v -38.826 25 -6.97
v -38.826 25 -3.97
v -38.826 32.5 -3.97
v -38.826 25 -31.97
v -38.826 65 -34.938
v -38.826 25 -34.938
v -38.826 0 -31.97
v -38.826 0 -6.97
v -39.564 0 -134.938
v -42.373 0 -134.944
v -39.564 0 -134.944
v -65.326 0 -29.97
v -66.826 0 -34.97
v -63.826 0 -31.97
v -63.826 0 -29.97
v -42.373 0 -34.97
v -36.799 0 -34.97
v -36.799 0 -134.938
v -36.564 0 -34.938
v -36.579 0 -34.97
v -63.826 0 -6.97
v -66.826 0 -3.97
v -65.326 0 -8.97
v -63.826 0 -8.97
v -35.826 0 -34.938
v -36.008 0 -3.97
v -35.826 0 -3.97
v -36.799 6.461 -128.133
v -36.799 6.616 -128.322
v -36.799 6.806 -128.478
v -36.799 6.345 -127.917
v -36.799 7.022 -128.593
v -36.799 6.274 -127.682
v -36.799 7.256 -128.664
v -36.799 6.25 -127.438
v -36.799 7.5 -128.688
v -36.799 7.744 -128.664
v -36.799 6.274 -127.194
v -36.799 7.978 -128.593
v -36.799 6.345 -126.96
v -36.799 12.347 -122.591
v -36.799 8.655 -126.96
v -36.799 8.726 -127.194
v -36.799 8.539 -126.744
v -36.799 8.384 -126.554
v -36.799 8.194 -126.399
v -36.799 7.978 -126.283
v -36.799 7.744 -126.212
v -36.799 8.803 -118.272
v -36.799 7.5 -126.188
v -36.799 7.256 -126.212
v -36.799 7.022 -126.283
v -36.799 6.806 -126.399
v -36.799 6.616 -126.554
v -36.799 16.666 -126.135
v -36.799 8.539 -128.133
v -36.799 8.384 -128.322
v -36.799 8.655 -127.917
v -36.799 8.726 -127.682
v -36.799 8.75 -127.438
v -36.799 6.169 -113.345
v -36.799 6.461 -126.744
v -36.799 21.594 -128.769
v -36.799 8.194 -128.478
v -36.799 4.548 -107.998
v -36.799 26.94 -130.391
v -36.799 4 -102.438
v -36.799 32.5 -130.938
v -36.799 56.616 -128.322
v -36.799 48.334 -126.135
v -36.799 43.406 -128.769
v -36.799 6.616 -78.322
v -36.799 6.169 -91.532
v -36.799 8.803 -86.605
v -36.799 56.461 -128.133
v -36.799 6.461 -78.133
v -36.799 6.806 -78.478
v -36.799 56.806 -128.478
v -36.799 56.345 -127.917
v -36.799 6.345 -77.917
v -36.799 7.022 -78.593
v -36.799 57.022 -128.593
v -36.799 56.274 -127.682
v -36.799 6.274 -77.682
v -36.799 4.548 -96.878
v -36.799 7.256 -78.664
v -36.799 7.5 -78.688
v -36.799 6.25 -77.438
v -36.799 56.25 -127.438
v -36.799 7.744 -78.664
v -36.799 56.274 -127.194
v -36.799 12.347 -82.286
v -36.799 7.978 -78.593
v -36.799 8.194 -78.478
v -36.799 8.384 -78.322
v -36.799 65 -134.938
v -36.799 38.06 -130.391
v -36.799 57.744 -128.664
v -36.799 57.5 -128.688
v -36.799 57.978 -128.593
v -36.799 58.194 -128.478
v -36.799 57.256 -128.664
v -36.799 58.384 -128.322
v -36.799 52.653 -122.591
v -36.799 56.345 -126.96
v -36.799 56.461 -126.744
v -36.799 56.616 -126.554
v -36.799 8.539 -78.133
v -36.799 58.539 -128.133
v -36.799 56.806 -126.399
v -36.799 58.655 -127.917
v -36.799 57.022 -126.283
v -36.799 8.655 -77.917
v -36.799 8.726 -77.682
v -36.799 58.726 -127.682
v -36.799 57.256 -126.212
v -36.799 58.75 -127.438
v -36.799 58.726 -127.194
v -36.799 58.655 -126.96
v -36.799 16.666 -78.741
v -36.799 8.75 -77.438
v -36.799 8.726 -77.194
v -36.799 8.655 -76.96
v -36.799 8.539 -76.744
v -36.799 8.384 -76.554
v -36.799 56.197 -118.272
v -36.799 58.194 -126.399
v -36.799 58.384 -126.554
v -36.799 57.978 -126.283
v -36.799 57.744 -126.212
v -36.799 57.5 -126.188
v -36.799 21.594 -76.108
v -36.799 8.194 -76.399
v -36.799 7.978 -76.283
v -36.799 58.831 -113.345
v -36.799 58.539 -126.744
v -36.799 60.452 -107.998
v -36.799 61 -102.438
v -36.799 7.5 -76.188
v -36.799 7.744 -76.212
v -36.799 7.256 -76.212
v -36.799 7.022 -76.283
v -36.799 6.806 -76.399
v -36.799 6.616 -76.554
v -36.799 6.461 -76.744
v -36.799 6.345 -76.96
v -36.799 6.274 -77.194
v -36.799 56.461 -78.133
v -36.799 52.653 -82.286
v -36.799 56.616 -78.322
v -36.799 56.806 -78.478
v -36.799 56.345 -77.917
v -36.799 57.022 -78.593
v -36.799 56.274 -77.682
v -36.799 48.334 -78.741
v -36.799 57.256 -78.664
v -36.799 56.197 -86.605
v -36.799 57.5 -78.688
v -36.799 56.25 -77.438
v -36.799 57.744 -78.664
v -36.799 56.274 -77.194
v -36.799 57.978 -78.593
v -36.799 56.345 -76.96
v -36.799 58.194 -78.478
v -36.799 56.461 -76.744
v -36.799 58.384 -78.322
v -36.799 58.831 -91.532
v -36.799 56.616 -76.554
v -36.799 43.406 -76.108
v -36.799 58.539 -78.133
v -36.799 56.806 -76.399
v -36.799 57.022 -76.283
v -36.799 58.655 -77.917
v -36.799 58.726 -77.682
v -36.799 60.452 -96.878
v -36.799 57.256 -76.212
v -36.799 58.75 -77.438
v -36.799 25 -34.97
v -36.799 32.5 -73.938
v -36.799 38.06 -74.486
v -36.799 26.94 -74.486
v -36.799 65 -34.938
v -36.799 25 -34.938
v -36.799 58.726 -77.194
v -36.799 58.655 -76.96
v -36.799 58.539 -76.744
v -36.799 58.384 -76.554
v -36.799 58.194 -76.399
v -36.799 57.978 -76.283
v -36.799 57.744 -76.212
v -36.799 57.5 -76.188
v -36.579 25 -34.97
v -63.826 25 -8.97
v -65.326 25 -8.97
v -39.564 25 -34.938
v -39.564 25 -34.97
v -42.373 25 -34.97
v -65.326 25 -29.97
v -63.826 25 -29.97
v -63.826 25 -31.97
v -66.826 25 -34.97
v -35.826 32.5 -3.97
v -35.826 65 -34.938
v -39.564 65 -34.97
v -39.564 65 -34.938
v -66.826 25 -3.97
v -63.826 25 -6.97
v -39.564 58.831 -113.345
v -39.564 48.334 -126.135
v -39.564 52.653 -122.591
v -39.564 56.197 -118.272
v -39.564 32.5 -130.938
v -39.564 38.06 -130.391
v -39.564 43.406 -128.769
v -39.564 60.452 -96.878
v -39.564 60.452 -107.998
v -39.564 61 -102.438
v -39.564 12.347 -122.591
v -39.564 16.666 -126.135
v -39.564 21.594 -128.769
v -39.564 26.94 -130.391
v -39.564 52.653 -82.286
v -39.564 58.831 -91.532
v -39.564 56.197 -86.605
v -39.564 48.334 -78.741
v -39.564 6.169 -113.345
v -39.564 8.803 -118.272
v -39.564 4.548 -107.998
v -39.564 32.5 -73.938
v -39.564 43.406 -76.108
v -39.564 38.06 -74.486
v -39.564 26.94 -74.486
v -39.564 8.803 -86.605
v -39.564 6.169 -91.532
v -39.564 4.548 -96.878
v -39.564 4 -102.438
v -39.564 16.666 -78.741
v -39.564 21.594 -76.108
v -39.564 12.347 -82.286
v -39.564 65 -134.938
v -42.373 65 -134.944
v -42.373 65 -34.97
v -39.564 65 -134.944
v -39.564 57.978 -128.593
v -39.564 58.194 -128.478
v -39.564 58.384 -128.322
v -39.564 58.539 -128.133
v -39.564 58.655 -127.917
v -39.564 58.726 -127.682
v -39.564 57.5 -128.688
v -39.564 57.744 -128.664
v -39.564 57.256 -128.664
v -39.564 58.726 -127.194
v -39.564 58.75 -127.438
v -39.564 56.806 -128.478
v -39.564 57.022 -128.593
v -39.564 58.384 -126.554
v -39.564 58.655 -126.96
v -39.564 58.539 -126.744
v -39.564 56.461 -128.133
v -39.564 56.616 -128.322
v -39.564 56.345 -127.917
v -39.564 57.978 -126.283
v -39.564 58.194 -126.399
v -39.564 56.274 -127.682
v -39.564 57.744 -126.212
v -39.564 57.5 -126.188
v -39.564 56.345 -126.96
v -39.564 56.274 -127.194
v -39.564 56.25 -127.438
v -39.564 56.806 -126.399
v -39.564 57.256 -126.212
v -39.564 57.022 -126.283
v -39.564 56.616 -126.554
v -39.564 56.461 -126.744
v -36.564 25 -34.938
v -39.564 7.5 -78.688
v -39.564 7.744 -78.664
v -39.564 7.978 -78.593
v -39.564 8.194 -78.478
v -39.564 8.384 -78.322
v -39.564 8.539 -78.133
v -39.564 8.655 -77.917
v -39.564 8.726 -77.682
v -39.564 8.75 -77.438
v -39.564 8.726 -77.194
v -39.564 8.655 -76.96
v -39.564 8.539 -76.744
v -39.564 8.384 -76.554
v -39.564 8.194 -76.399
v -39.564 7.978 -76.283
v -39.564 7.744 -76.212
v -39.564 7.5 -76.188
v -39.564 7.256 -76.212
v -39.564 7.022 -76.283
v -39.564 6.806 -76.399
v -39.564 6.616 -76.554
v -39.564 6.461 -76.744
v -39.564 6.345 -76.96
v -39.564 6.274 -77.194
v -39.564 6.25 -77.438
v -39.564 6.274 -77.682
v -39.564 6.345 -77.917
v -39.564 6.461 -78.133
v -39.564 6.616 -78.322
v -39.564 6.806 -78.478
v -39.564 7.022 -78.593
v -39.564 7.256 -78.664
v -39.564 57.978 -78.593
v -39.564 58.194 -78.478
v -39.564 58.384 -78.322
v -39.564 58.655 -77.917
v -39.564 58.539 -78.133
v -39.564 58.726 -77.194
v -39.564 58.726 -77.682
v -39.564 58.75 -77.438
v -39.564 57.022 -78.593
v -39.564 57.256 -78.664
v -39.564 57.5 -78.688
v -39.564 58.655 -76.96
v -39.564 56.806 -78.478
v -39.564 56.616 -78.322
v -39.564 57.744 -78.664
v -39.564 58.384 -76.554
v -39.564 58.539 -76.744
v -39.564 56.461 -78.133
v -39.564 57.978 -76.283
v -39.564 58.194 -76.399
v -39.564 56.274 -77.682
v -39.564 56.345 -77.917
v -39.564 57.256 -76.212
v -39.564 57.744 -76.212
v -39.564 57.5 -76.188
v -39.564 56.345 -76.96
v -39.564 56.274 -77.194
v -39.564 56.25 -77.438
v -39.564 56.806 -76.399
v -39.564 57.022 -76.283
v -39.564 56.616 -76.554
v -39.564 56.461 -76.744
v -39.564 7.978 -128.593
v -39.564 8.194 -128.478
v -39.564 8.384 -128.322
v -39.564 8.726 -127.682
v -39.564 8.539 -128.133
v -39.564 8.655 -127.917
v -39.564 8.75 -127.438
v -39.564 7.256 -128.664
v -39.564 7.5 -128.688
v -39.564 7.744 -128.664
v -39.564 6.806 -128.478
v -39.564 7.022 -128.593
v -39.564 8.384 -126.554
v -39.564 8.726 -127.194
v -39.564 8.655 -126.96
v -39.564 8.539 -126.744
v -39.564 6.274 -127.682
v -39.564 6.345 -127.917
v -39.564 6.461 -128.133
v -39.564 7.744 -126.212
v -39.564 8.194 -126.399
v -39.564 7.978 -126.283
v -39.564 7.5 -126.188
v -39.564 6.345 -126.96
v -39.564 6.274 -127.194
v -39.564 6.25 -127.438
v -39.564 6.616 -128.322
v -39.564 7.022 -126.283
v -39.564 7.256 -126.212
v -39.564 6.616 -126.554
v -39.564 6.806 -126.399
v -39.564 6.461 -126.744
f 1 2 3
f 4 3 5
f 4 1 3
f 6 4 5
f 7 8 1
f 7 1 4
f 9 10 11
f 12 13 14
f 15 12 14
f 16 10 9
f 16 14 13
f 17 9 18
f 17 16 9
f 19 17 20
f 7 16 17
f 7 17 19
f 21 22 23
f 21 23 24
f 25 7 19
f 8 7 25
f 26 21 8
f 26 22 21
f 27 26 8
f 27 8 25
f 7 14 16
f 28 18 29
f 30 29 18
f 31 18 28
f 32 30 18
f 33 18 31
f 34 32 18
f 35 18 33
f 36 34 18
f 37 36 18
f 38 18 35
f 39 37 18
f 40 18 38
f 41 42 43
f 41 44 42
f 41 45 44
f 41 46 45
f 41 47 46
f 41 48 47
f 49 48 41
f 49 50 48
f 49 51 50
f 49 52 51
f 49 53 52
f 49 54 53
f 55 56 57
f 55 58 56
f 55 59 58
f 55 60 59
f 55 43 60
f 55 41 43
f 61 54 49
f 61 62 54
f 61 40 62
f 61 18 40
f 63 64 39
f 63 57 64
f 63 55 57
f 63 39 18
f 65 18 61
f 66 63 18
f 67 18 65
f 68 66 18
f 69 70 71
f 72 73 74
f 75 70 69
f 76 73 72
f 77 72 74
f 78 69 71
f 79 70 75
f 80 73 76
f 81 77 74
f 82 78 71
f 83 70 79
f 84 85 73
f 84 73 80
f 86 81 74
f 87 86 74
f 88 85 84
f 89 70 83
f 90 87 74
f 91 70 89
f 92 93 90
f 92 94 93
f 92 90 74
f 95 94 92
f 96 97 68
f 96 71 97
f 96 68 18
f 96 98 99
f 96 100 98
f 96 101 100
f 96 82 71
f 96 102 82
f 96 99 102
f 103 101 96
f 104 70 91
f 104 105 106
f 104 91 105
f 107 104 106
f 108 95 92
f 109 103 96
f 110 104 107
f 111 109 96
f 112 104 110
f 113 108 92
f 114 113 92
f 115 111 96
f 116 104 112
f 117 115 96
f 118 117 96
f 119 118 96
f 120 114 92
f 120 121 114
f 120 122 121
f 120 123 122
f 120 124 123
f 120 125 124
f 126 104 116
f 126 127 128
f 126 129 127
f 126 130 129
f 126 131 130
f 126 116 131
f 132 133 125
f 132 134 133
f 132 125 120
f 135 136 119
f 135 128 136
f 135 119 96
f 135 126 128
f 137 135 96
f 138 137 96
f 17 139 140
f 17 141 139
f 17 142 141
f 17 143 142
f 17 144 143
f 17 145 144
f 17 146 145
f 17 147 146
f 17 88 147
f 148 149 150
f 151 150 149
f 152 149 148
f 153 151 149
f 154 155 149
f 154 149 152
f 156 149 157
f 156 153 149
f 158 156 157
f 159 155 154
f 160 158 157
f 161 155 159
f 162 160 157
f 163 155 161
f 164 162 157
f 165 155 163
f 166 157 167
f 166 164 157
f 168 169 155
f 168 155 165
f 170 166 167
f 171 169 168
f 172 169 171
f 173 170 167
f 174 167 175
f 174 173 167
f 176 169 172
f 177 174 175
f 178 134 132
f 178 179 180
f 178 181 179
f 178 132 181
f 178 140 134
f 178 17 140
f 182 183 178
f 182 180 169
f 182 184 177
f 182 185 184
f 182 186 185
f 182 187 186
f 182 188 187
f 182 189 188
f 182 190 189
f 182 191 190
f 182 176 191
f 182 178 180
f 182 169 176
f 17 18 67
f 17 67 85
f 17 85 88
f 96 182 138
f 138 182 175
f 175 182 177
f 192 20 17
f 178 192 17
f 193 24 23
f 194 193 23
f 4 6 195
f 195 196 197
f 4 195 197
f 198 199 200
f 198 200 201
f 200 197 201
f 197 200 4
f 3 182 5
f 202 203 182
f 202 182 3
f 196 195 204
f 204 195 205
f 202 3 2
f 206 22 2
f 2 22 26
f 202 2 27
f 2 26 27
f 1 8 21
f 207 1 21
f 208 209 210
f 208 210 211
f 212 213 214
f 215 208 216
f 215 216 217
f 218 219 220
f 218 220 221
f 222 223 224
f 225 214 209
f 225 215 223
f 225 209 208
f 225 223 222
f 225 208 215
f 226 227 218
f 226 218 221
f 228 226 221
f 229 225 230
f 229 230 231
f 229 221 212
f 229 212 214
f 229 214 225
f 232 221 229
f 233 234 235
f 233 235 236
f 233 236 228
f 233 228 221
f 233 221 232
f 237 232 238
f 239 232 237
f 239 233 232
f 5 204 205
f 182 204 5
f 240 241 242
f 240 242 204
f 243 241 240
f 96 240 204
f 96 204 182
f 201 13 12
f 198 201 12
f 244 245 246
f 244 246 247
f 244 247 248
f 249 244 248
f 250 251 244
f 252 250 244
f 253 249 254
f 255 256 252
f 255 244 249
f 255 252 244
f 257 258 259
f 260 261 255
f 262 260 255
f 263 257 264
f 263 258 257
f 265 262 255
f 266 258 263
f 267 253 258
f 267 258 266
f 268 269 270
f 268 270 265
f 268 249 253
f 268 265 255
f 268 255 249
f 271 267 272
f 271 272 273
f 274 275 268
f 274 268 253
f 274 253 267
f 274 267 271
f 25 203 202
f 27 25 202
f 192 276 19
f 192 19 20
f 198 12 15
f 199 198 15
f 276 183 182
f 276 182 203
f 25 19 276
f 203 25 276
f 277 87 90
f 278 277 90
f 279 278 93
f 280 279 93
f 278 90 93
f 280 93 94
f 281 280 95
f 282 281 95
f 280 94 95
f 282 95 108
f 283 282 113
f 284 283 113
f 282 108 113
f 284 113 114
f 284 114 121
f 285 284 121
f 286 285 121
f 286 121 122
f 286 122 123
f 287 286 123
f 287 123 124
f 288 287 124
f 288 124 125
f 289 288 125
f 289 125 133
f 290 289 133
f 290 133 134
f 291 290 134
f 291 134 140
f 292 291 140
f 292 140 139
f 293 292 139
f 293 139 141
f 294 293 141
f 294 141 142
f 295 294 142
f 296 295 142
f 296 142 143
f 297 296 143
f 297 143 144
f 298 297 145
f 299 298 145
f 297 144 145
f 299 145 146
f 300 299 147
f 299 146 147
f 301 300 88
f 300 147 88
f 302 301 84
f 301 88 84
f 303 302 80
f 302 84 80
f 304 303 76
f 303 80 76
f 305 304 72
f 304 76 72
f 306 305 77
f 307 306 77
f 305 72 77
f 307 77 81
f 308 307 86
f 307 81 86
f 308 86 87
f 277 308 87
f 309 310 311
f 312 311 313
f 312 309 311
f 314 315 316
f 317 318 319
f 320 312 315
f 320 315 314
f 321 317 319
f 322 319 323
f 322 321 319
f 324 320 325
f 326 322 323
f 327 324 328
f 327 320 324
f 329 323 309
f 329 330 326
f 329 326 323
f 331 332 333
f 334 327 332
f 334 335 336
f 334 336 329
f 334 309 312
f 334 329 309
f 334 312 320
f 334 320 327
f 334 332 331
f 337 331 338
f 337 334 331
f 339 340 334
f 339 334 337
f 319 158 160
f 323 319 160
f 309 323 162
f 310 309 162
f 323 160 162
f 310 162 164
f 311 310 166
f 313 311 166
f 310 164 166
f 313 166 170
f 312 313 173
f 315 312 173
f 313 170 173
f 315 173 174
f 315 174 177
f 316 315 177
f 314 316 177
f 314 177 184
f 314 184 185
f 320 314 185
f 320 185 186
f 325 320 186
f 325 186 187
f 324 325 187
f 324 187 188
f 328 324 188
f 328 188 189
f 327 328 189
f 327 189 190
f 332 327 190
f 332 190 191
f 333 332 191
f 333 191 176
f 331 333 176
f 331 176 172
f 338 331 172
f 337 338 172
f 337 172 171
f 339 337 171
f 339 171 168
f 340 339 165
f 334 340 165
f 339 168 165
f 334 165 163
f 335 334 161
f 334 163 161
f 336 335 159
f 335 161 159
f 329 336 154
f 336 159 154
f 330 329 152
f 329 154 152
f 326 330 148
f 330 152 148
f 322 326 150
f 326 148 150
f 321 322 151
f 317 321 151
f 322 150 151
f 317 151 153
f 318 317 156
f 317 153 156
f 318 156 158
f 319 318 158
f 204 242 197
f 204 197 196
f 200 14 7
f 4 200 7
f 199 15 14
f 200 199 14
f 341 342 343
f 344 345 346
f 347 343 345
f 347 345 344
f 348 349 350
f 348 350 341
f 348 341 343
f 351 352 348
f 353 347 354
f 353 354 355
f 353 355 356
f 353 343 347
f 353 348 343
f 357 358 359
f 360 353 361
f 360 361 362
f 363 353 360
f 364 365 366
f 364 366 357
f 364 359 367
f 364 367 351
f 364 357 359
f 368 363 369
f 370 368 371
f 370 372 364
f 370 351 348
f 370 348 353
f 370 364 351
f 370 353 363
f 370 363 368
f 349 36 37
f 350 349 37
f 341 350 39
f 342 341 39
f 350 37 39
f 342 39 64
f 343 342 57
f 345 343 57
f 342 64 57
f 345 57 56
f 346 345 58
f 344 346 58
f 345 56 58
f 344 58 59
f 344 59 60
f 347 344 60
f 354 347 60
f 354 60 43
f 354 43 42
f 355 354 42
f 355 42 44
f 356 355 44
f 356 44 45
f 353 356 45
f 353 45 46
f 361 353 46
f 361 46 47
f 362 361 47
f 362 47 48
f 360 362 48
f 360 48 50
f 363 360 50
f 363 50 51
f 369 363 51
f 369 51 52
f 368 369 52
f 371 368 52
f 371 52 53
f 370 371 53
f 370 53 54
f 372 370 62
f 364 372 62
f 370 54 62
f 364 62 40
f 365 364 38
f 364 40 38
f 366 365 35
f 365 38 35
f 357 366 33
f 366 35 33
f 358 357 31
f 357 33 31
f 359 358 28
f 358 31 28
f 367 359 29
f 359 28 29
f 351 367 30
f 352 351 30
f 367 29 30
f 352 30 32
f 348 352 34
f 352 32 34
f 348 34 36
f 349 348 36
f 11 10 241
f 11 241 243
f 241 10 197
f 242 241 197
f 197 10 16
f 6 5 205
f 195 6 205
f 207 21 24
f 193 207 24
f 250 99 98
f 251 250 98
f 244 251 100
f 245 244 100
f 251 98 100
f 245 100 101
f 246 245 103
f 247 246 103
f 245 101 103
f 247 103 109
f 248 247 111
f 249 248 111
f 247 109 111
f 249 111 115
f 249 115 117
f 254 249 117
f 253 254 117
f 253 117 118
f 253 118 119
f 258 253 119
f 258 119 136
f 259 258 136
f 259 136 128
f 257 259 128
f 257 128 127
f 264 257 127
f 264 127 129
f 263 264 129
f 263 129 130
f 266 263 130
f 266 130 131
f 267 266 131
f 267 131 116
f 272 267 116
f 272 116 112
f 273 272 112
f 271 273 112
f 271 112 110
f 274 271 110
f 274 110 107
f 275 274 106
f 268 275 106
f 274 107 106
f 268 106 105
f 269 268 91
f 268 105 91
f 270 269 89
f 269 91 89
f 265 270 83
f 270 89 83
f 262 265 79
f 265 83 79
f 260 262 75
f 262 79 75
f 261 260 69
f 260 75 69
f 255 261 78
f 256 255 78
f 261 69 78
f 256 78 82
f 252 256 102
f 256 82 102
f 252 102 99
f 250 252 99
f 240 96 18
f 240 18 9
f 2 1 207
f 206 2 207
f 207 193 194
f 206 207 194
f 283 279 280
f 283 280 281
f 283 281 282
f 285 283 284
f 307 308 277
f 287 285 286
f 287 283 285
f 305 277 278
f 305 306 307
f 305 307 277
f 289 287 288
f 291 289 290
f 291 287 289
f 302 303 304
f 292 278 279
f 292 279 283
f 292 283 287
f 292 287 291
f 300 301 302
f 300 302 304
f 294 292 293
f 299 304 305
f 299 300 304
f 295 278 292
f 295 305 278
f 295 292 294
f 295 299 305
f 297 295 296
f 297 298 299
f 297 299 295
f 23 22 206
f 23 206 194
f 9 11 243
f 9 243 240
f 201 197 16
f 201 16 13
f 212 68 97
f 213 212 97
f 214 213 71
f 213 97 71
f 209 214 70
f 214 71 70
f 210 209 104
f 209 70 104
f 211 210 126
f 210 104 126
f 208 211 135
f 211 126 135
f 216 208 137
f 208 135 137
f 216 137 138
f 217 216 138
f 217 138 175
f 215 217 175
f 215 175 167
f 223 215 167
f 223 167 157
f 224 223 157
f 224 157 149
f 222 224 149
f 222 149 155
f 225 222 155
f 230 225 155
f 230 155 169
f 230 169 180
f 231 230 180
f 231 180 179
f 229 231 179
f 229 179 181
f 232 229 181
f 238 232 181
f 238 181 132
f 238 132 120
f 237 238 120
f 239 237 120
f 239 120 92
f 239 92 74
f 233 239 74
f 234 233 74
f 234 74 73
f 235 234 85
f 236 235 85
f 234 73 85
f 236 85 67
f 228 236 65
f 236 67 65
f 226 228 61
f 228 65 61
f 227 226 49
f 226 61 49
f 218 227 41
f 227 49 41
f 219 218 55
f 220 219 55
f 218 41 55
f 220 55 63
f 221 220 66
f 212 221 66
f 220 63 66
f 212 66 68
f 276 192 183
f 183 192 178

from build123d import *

# Parameters (mm, degrees)
EXTRUDE_1_DEPTH      = 25
CUT_EXTRUDE_4_DEPTH  = 80.457942189
SKETCH_7_W           = 16.60831278
SKETCH_7_H           = 38.473598513
CUT_EXTRUDE_14_DEPTH = 80.457942189
SKETCH_8_W           = 5
SKETCH_8_H           = 30.968526609
EXTRUDE_2_DEPTH      = 25
SKETCH_9_W           = 2.765387297
SKETCH_9_H           = 65
EXTRUDE_3_DEPTH      = 100
SKETCH_10_W          = 5.026813651
SKETCH_10_H          = 30.968526609
EXTRUDE_4_DEPTH      = 40
CUT_EXTRUDE_15_DEPTH = 100
SKETCH_12_R          = 28.5
CUT_EXTRUDE_16_DEPTH = 100
SKETCH_13_R          = 1.25
CUT_EXTRUDE_17_DEPTH = 100
SKETCH_14_W          = 2.026813651
SKETCH_14_H          = 30.968526609
CUT_EXTRUDE_19_DEPTH = 100
EXTRUDE_5_REACH      = 166.009
SKETCH_16_W          = 2.808181224
SKETCH_16_H          = 99.974557172


with BuildPart() as part:
    # Эскиз1 → Бобышка-Вытянуть1 (new body)
    with BuildSketch(Plane(origin=(0, 0, 0), x_dir=(1, 0, 0), z_dir=(0, 1, 0))):
        Polygon((-66.825757576, 34.969739794), (-66.825757576, 29.969739794), (-63.825757576, 29.969739794), (-63.825757576, 31.969739794), (-38.825757576, 31.969739794), (-38.825757576, 6.969739794), (-63.825757576, 6.969739794), (-63.825757576, 8.969739794), (-66.825757576, 8.969739794), (-66.825757576, 3.969739794), (-22.123470102, 3.969739794), (-36.579007505, 34.969739794), align=None)
    extrude(amount=EXTRUDE_1_DEPTH)

    # Эскиз3 → Вырез-Вытянуть4 (cut, through all)
    with BuildSketch(Plane.XZ):
        Polygon((-66.825757576, -3.969739794), (-65.325757576, -8.969739794), (-66.825757576, -8.969739794), align=None)
        Polygon((-66.825757576, -29.969739794), (-66.825757576, -34.969739794), (-65.325757576, -29.969739794), align=None)
    extrude(amount=-CUT_EXTRUDE_4_DEPTH, mode=Mode.SUBTRACT)

    # Эскиз7 → Вырез-Вытянуть14 (cut, through all)
    with BuildSketch(Plane(origin=(0, 0, 0), x_dir=(-1, 0, 0), z_dir=(0, -1, 0))):
        with Locations((27.703474463, 20.539743139)):
            Rectangle(SKETCH_7_W, SKETCH_7_H)
    extrude(amount=-CUT_EXTRUDE_14_DEPTH, mode=Mode.SUBTRACT)

    # Эскиз8 → Бобышка-Вытянуть2 (add)
    with BuildSketch(Plane(origin=(0, 0, 0), x_dir=(-1, 0, 0), z_dir=(0, -1, 0))):
        with Locations((36.298943925, 19.454003098)):
            Rectangle(SKETCH_8_W, SKETCH_8_H)
    extrude(amount=-EXTRUDE_2_DEPTH)

    # Эскиз9 → Бобышка-Вытянуть3 (add)
    with BuildSketch(Plane(origin=(0, 0, -34.938266403), x_dir=(-1, 0, 0), z_dir=(0, 0, -1))):
        with Locations((38.181637573, 32.5)):
            Rectangle(SKETCH_9_W, SKETCH_9_H)
    extrude(amount=EXTRUDE_3_DEPTH)

    # Эскиз10 → Бобышка-Вытянуть4 (add)
    with BuildSketch(Plane(origin=(0, 25, 0), x_dir=(1, 0, 0), z_dir=(0, 1, 0))):
        with Locations((-36.312350751, 19.454003098)):
            Rectangle(SKETCH_10_W, SKETCH_10_H)
    extrude(amount=EXTRUDE_4_DEPTH)

    # Эскиз11 → Вырез-Вытянуть15 (cut)
    with BuildSketch(Plane(origin=(-33.798943925, 0, 0), x_dir=(0, 0, -1), z_dir=(1, 0, 0))):
        Polygon((34.938266403, 65), (3.969739794, 32.5), (3.969739794, 65), align=None)
    extrude(amount=-CUT_EXTRUDE_15_DEPTH, mode=Mode.SUBTRACT)

    # Эскиз12 → Вырез-Вытянуть16 (cut)
    with BuildSketch(Plane(origin=(-36.798943925, 0, 0), x_dir=(0, 0, -1), z_dir=(1, 0, 0))):
        with Locations((102.438266403, 32.5)):
            Circle(SKETCH_12_R)
    extrude(amount=-CUT_EXTRUDE_16_DEPTH, mode=Mode.SUBTRACT)

    # Эскиз13 → Вырез-Вытянуть17 (cut)
    with BuildSketch(Plane(origin=(-36.798943925, 0, 0), x_dir=(0, 0, -1), z_dir=(1, 0, 0))):
        with Locations((77.438266403, 57.5)):
            Circle(SKETCH_13_R)
        with Locations((127.438266403, 57.5)):
            Circle(SKETCH_13_R)
        with Locations((127.438266403, 7.5)):
            Circle(SKETCH_13_R)
        with Locations((77.438266403, 7.5)):
            Circle(SKETCH_13_R)
    extrude(amount=-CUT_EXTRUDE_17_DEPTH, mode=Mode.SUBTRACT)

    # Эскиз14 → Вырез-Вытянуть19 (cut)
    with BuildSketch(Plane.XZ):
        with Locations((-34.812350751, -19.454003098)):
            Rectangle(SKETCH_14_W, SKETCH_14_H)
    extrude(amount=-CUT_EXTRUDE_19_DEPTH, mode=Mode.SUBTRACT)

    # Бобышка-Вытянуть5: up to this face of the body (flat: up to its plane)
    extrude_5_end = Plane(part.part.faces().sort_by_distance((-38.181637574, 65, -84.938266403))[0])
    # Эскиз16 → Бобышка-Вытянуть5 (add, up to the picked face)
    with BuildSketch(Plane.XZ, mode=Mode.PRIVATE) as extrude_5_sk1:
        with Locations((-40.968421834, -84.95701838)):
            Rectangle(SKETCH_16_W, SKETCH_16_H)
    extrude_5_tool1 = split(extrude(extrude_5_sk1.sketch, amount=-EXTRUDE_5_REACH, mode=Mode.PRIVATE), bisect_by=extrude_5_end, keep=Keep.BOTH, mode=Mode.PRIVATE)
    add(extrude_5_tool1.solids().sort_by(Axis((-40.968422, 0, -84.957018), (0, 1, 0)))[0])


solid = part.part
